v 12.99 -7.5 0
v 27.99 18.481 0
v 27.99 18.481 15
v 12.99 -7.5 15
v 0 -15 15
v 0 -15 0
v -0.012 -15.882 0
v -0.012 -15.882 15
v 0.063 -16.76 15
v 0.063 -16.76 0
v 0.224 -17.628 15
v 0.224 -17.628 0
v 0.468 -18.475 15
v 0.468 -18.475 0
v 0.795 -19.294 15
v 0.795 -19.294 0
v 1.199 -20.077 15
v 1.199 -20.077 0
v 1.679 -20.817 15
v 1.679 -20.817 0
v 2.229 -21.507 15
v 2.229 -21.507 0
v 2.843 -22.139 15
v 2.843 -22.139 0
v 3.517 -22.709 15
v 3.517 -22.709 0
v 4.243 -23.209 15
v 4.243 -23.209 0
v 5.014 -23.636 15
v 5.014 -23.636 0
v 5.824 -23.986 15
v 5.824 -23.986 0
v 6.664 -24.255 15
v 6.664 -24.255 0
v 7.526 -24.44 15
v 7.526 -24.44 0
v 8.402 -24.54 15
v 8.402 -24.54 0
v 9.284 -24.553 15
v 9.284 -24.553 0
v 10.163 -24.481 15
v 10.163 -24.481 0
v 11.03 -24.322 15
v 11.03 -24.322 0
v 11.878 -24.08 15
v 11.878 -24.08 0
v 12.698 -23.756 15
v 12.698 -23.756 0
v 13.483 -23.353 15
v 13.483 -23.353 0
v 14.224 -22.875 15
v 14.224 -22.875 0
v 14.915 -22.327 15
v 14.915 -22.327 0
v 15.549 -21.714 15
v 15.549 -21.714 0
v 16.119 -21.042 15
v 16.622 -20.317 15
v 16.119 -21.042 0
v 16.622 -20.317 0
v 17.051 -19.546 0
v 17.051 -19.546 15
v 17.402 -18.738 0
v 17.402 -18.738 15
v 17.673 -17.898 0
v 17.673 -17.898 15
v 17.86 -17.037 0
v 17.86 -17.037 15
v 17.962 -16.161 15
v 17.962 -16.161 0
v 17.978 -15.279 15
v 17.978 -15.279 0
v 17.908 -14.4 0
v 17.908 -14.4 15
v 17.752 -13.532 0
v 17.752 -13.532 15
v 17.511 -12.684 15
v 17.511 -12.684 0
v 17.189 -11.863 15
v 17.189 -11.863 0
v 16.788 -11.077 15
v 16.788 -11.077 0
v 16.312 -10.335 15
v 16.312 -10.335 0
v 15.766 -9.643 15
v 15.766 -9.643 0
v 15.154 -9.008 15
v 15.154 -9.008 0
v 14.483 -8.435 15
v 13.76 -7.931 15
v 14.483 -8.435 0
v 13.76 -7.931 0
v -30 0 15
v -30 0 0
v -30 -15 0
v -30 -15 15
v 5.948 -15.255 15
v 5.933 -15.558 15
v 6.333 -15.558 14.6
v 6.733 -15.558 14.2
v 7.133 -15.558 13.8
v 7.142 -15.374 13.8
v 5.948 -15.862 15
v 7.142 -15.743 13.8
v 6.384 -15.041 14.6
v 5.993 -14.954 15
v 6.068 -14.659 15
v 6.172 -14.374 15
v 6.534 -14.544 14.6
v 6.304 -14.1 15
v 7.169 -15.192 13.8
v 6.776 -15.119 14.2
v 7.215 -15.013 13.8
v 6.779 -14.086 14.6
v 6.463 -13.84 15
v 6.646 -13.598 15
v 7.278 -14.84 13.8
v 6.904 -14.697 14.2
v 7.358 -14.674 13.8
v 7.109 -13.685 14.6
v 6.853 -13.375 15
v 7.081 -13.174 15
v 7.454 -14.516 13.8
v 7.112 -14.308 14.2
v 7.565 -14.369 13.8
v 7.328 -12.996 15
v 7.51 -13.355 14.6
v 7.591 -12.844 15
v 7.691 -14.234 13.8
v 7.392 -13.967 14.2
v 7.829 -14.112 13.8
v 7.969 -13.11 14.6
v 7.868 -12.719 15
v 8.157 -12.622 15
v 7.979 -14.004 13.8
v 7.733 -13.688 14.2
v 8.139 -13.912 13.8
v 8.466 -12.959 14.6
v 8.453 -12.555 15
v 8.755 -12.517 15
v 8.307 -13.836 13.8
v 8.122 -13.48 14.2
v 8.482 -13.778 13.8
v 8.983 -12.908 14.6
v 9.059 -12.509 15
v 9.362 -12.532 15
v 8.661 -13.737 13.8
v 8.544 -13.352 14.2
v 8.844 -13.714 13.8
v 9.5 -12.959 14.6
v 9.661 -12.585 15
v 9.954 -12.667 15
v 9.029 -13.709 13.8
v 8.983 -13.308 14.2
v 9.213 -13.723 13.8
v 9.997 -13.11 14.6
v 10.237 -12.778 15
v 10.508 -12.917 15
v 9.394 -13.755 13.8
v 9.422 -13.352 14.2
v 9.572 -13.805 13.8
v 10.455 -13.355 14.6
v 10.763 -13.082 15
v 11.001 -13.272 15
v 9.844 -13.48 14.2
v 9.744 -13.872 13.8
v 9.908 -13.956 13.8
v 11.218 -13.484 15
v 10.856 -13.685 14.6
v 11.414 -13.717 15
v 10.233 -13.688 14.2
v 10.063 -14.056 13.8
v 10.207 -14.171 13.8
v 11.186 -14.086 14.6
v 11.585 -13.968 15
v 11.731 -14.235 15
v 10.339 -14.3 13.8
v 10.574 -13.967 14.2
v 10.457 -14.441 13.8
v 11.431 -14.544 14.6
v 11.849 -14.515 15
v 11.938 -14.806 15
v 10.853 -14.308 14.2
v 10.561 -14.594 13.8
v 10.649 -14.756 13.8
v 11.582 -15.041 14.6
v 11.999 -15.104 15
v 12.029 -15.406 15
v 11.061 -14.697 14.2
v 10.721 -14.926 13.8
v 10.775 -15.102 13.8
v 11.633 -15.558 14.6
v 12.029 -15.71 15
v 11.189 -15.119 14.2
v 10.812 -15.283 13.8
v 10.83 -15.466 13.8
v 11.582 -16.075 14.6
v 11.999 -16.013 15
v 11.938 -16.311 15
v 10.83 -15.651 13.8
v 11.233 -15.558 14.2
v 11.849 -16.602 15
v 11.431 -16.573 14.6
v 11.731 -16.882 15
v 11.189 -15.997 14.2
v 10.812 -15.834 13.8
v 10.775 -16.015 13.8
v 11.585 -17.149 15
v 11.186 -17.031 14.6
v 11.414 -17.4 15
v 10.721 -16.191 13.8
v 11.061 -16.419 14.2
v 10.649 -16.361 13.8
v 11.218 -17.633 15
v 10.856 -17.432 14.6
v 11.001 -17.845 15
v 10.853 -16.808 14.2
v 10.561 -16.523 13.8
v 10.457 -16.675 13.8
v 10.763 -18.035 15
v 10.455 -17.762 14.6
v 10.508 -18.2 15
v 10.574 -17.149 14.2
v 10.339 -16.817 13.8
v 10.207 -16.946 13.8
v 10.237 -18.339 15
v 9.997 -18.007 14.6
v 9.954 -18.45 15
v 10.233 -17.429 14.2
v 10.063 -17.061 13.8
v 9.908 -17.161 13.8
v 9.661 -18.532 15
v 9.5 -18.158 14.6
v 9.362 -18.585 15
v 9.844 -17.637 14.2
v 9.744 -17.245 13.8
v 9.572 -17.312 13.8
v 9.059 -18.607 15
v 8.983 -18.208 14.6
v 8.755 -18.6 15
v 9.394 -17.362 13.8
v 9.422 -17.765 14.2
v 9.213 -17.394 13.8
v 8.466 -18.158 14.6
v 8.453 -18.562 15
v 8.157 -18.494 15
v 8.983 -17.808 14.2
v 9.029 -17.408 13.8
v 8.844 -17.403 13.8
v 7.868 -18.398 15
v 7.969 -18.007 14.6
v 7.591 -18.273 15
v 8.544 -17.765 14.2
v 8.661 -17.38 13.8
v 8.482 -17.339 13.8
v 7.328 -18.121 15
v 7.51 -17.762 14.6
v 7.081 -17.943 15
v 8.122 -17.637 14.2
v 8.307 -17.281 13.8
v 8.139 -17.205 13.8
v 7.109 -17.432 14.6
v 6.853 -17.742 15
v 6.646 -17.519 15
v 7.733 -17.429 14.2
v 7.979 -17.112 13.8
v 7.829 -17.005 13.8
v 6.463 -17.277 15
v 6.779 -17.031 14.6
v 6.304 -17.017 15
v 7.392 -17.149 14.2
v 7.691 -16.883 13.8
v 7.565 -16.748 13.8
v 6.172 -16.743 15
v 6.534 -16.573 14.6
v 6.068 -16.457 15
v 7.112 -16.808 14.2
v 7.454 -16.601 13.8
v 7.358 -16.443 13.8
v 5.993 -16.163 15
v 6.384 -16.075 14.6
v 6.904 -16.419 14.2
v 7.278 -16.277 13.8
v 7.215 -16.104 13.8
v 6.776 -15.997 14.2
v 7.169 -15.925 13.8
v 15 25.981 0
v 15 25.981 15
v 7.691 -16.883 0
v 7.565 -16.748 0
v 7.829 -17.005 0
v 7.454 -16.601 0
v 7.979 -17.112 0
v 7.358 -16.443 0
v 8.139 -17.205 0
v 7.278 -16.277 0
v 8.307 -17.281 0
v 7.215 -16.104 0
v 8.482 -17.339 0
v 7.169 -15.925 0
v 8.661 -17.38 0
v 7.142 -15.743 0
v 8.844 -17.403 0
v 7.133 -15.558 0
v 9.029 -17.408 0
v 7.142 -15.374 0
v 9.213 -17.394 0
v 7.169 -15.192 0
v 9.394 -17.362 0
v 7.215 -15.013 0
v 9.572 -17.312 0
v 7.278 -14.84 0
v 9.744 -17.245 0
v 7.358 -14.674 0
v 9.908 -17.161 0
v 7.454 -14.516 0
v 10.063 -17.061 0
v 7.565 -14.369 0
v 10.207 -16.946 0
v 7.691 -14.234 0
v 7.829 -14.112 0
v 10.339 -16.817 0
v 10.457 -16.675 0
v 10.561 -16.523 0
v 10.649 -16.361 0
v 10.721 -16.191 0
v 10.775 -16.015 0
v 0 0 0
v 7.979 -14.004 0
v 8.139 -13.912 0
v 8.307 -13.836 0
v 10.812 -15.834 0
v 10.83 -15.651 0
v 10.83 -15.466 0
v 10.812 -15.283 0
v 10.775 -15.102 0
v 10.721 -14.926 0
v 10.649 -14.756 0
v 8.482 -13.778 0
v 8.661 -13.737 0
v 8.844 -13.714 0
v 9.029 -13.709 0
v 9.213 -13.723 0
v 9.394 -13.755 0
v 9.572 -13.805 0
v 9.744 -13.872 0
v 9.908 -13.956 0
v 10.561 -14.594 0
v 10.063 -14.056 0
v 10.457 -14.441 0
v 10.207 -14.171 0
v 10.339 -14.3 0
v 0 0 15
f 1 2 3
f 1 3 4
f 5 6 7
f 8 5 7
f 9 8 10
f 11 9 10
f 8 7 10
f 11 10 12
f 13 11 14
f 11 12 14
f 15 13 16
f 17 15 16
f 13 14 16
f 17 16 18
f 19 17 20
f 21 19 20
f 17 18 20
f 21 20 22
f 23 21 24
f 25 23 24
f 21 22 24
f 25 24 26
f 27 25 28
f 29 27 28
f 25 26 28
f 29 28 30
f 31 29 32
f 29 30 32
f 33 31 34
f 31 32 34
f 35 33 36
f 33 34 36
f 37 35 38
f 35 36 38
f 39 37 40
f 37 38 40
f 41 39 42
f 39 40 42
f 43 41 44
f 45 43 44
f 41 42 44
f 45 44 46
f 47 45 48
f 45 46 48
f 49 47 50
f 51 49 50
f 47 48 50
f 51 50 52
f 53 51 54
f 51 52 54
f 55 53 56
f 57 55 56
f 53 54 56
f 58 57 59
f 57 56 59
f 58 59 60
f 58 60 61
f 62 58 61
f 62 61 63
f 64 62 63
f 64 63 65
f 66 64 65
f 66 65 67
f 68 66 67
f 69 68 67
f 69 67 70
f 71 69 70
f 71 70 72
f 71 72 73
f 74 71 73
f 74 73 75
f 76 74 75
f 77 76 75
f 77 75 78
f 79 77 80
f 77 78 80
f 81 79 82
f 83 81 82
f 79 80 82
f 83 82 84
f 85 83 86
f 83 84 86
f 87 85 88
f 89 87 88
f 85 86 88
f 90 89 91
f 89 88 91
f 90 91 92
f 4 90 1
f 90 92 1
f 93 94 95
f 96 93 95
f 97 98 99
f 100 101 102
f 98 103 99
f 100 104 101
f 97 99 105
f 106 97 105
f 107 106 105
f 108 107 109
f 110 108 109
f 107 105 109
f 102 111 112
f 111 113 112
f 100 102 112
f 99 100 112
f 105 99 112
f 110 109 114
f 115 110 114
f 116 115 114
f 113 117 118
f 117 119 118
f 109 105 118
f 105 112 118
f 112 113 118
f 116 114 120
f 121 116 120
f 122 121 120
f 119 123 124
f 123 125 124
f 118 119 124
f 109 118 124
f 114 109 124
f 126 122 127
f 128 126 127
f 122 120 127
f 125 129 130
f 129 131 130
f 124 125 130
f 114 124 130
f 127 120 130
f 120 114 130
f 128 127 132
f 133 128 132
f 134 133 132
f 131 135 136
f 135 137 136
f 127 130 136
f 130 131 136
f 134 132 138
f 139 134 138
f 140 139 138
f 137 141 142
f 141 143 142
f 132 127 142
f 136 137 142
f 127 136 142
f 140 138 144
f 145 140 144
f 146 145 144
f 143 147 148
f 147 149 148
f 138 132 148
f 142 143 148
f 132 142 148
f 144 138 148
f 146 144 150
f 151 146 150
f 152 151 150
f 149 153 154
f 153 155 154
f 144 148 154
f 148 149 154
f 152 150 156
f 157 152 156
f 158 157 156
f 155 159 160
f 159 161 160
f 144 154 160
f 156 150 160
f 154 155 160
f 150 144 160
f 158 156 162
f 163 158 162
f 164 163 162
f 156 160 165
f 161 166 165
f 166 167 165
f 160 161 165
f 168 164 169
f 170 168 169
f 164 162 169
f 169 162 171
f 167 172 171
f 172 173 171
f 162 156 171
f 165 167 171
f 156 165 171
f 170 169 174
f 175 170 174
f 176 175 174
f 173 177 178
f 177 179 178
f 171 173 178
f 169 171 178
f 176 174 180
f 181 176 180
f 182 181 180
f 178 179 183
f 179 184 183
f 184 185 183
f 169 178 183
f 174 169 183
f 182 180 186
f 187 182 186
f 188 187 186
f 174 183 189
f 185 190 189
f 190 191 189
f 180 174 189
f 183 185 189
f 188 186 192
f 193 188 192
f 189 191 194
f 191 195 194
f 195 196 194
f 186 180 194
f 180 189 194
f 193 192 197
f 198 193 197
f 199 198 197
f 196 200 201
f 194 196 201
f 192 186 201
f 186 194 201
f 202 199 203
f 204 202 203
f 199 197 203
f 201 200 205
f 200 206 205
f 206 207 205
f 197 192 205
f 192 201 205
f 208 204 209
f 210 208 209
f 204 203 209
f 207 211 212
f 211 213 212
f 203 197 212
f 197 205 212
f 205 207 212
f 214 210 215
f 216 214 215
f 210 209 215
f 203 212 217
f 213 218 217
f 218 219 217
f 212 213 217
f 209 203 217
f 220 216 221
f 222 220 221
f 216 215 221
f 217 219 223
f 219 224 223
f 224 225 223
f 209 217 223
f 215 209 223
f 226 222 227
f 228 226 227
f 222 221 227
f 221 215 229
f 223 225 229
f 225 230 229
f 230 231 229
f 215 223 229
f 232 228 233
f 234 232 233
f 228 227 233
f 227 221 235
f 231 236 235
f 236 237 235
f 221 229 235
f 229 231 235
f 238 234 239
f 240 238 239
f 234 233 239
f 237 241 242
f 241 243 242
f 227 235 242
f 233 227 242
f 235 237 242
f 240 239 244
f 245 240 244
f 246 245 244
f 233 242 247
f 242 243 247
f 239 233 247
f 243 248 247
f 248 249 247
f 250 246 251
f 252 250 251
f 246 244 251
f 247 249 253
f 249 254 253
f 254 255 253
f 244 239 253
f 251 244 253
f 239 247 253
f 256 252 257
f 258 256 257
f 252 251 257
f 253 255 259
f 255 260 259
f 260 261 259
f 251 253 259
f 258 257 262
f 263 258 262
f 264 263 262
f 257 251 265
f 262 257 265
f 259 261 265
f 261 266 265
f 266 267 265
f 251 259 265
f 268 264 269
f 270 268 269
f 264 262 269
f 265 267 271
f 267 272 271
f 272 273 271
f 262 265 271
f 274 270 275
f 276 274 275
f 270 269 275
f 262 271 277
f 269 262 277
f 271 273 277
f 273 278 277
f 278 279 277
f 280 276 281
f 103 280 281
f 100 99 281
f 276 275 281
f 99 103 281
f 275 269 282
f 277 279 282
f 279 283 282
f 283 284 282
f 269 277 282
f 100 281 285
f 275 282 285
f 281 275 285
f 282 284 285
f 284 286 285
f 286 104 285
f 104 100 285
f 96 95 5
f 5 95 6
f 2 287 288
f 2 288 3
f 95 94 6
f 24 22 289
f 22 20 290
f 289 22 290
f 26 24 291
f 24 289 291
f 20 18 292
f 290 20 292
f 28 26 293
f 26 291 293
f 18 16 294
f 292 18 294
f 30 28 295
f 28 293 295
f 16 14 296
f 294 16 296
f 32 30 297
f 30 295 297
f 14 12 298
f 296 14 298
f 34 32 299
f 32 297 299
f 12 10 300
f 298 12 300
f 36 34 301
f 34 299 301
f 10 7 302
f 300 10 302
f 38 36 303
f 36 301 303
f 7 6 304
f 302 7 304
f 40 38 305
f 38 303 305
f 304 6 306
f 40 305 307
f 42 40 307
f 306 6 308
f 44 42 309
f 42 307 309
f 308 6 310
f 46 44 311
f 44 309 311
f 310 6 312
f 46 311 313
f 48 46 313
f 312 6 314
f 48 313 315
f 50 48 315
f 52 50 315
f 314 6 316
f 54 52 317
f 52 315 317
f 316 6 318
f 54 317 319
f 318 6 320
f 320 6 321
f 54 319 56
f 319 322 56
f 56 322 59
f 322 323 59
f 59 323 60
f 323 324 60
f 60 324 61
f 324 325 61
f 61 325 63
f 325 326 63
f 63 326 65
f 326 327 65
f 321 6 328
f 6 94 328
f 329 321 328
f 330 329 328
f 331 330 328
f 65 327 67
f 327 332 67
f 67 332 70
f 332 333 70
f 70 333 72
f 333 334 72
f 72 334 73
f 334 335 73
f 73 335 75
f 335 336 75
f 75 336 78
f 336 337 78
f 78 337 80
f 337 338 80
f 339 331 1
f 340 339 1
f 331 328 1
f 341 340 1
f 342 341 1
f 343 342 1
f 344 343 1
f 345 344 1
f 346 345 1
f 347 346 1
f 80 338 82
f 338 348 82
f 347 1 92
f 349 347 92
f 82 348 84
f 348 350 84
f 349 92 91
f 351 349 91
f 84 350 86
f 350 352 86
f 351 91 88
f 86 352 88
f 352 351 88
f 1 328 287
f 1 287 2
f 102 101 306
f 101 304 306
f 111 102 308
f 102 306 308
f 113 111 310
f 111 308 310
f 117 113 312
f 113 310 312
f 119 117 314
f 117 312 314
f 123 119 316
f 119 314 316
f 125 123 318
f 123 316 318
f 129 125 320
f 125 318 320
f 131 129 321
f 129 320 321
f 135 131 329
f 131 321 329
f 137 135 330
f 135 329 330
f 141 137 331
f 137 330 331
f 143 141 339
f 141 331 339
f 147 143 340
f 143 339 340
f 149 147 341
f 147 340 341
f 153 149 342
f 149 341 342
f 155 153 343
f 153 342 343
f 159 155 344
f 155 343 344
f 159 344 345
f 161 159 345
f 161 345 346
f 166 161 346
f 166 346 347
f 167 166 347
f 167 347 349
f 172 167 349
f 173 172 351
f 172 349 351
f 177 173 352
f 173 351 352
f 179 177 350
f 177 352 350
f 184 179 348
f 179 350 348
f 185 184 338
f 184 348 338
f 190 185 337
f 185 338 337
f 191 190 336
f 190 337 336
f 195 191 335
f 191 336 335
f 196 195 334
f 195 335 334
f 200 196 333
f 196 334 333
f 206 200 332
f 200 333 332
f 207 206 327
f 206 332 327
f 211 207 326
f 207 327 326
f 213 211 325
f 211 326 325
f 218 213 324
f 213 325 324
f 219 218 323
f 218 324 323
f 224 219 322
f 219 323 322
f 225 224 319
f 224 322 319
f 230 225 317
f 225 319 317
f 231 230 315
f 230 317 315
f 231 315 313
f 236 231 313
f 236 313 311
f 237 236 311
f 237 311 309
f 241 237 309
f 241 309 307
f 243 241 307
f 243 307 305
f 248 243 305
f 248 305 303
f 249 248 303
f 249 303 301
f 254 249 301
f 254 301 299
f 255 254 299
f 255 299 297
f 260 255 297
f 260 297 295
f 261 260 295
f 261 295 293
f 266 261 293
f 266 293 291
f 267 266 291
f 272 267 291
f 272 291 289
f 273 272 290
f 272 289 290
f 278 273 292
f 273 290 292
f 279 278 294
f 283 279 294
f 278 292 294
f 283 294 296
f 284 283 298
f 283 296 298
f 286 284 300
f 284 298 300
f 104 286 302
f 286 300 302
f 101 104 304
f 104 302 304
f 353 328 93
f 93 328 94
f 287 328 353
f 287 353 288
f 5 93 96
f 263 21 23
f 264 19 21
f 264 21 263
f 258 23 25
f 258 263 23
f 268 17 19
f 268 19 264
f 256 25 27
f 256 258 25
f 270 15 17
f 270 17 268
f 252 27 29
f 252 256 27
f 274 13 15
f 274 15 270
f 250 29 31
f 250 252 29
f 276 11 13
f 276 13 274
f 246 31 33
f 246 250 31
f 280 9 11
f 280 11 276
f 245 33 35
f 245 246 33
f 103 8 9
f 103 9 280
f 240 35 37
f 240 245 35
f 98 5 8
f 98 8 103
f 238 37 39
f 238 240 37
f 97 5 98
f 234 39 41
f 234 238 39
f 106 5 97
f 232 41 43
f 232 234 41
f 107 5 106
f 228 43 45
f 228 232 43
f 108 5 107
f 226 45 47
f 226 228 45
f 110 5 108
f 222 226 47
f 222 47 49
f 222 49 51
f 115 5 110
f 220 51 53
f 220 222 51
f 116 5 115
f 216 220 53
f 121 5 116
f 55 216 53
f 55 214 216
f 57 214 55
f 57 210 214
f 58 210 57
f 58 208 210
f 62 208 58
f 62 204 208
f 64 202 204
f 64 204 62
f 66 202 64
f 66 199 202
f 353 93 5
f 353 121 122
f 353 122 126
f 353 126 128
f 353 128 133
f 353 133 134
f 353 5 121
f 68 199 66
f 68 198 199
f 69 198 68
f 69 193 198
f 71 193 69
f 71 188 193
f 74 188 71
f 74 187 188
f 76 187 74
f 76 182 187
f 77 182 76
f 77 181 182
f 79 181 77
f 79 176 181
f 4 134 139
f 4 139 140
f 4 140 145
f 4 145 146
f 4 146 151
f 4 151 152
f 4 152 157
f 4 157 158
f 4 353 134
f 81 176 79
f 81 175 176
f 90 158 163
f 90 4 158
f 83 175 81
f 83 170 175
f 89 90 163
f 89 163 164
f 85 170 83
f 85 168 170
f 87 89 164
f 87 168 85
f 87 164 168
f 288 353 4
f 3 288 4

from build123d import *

# Parameters (mm, degrees)
PAD_DEPTH        = 15
HOLE_D           = 3.7
HOLE_CSINK_D     = 6.1
HOLE_CSINK_ANGLE = 90


with BuildPart() as part:
    # Sketch → Pad (new body)
    with BuildSketch(Plane.XY):
        with BuildLine():
            Line((0, 0), (-30, 0))
            Line((-30, 0), (-30, -15))
            Line((-30, -15), (0, -15))
            ThreePointArc((0, -15), (13.482659, -23.352651), (12.990381, -7.5))
            Line((27.990381, 18.480762), (12.990381, -7.5))
            Line((15, 25.980762), (27.990381, 18.480762))
            Line((0, 0), (15, 25.980762))
        make_face()
    extrude(amount=PAD_DEPTH)

    # Hole (through all)
    with Locations(Plane.XY.offset(15)):
        with Locations((8.982659, -15.558422)):
            CounterSinkHole(HOLE_D / 2, HOLE_CSINK_D / 2, counter_sink_angle=HOLE_CSINK_ANGLE)


solid = part.part
